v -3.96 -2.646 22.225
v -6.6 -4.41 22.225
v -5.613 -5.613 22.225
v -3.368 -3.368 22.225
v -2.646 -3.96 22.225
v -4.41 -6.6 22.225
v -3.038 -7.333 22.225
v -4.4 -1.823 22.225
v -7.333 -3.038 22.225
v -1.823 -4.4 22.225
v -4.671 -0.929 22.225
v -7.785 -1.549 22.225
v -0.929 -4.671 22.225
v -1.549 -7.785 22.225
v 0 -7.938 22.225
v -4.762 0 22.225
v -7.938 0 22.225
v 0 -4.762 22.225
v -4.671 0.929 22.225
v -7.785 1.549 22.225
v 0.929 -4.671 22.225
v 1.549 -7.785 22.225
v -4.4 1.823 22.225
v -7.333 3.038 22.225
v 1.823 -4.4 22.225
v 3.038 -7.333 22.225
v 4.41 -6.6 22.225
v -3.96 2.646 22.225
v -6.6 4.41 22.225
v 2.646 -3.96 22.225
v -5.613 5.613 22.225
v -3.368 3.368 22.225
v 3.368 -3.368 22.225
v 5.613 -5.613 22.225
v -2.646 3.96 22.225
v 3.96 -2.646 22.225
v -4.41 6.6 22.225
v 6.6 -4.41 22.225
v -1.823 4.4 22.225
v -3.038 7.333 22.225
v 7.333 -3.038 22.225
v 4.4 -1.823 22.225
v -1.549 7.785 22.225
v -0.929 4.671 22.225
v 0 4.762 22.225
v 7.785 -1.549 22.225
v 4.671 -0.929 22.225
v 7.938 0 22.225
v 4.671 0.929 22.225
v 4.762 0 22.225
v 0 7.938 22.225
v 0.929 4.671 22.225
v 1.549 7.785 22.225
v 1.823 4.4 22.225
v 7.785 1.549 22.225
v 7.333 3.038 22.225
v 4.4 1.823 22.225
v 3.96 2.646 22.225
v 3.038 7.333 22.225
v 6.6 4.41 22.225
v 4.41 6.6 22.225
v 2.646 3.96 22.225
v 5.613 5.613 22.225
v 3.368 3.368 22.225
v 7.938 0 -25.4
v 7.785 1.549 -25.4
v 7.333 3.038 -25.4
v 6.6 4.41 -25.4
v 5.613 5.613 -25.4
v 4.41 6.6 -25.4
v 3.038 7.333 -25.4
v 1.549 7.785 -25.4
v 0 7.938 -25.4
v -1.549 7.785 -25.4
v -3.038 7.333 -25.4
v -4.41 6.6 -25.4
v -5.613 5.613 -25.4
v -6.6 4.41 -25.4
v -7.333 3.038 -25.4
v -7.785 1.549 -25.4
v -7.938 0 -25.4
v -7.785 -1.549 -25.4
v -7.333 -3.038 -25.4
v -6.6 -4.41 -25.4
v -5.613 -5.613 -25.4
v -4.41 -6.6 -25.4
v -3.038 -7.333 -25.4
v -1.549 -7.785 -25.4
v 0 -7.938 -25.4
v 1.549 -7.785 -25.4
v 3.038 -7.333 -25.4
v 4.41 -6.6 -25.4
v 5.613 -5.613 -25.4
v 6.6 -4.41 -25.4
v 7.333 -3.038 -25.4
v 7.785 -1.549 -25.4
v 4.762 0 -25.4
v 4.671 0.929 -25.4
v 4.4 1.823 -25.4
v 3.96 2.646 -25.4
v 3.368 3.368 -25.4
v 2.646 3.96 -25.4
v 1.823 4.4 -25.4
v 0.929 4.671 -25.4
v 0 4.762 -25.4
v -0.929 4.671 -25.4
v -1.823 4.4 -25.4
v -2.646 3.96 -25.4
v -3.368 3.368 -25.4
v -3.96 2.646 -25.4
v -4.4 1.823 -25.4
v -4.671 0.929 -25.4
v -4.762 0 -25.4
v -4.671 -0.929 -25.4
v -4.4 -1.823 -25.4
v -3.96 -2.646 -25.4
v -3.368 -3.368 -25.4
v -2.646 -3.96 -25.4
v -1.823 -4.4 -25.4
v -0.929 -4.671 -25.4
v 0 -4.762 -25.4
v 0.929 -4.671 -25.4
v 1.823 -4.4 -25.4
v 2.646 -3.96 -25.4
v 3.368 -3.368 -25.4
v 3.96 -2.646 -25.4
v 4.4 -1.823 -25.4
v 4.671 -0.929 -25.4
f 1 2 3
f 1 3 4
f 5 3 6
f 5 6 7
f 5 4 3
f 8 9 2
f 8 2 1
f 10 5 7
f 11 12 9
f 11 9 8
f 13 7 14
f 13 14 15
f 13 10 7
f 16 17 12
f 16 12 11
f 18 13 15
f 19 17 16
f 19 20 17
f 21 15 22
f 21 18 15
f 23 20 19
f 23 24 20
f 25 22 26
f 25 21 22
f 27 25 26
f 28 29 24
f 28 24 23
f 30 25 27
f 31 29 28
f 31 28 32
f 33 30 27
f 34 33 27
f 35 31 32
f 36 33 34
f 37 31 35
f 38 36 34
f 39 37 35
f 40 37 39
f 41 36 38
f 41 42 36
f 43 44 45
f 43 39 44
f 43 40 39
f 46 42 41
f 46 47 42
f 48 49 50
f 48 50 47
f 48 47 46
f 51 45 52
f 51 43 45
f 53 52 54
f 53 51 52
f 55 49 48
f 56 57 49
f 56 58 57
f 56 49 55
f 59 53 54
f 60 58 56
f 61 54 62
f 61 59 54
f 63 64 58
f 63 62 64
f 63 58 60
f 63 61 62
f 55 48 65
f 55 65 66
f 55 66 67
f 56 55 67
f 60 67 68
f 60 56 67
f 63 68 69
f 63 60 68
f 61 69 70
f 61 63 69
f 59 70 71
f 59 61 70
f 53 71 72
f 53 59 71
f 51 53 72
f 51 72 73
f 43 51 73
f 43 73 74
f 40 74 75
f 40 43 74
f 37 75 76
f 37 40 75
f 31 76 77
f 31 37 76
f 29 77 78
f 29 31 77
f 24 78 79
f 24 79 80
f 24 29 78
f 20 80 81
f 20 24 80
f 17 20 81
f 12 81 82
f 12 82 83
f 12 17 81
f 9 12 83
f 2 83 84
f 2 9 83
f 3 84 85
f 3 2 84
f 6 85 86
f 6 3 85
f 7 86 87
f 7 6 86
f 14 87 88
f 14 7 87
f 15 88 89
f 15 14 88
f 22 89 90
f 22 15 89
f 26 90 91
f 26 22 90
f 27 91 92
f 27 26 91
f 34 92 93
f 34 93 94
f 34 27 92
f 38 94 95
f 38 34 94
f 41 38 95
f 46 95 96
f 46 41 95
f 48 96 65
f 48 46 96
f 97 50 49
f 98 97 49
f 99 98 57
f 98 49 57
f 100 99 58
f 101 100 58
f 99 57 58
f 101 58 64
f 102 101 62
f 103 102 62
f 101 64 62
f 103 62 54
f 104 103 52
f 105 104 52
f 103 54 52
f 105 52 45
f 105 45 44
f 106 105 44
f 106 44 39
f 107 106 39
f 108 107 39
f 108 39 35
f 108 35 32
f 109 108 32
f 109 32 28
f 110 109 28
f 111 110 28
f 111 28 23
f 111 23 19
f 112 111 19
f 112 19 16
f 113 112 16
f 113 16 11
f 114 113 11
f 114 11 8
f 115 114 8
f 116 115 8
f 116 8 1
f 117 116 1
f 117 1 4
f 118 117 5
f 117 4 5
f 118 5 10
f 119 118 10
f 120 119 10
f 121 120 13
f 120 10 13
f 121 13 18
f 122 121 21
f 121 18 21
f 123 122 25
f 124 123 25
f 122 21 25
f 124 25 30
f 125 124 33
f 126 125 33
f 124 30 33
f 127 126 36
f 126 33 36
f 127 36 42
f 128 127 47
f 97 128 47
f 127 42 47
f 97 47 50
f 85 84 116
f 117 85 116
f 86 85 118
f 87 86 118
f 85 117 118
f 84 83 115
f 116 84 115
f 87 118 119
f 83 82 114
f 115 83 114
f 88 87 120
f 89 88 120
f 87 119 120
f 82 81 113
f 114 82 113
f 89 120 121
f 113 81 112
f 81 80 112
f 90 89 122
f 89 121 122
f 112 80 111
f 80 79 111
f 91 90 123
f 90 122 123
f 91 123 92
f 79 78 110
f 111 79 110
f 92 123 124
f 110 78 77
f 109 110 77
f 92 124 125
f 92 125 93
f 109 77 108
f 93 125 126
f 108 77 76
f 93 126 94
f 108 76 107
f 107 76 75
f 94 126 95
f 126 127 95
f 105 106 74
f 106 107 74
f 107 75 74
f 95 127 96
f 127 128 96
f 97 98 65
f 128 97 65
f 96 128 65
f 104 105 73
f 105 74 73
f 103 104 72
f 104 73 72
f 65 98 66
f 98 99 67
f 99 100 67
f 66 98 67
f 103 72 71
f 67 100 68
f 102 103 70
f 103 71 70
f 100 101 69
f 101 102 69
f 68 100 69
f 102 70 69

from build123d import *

# Parameters (mm, degrees)
SKETCH1_R          = 7.9375
SKETCH1_R_2        = 3.2004
EXTRUDE1_DEPTH     = 25.4
SKETCH5_R          = 7.9375
SKETCH5_R_2        = 3.2004
CUT_EXTRUDE1_DEPTH = 3.175
SKETCH6_R          = 4.7625
CUT_EXTRUDE2_DEPTH = 48.625


with BuildPart() as part:
    # Sketch1 → Extrude1 (new body, symmetric)
    with BuildSketch(Plane.XY):
        Circle(SKETCH1_R)
        Circle(SKETCH1_R_2, mode=Mode.SUBTRACT)
    extrude(amount=EXTRUDE1_DEPTH, both=True)

    # Sketch5 → Cut-Extrude1 (cut)
    with BuildSketch(Plane.XY.offset(25.4)):
        Circle(SKETCH5_R)
        Circle(SKETCH5_R_2, mode=Mode.SUBTRACT)
    extrude(amount=-CUT_EXTRUDE1_DEPTH, mode=Mode.SUBTRACT)

    # Sketch6 → Cut-Extrude2 (cut, through all)
    with BuildSketch(Plane.XY.offset(22.225)):
        Circle(SKETCH6_R)
    extrude(amount=-CUT_EXTRUDE2_DEPTH, mode=Mode.SUBTRACT)


solid = part.part
